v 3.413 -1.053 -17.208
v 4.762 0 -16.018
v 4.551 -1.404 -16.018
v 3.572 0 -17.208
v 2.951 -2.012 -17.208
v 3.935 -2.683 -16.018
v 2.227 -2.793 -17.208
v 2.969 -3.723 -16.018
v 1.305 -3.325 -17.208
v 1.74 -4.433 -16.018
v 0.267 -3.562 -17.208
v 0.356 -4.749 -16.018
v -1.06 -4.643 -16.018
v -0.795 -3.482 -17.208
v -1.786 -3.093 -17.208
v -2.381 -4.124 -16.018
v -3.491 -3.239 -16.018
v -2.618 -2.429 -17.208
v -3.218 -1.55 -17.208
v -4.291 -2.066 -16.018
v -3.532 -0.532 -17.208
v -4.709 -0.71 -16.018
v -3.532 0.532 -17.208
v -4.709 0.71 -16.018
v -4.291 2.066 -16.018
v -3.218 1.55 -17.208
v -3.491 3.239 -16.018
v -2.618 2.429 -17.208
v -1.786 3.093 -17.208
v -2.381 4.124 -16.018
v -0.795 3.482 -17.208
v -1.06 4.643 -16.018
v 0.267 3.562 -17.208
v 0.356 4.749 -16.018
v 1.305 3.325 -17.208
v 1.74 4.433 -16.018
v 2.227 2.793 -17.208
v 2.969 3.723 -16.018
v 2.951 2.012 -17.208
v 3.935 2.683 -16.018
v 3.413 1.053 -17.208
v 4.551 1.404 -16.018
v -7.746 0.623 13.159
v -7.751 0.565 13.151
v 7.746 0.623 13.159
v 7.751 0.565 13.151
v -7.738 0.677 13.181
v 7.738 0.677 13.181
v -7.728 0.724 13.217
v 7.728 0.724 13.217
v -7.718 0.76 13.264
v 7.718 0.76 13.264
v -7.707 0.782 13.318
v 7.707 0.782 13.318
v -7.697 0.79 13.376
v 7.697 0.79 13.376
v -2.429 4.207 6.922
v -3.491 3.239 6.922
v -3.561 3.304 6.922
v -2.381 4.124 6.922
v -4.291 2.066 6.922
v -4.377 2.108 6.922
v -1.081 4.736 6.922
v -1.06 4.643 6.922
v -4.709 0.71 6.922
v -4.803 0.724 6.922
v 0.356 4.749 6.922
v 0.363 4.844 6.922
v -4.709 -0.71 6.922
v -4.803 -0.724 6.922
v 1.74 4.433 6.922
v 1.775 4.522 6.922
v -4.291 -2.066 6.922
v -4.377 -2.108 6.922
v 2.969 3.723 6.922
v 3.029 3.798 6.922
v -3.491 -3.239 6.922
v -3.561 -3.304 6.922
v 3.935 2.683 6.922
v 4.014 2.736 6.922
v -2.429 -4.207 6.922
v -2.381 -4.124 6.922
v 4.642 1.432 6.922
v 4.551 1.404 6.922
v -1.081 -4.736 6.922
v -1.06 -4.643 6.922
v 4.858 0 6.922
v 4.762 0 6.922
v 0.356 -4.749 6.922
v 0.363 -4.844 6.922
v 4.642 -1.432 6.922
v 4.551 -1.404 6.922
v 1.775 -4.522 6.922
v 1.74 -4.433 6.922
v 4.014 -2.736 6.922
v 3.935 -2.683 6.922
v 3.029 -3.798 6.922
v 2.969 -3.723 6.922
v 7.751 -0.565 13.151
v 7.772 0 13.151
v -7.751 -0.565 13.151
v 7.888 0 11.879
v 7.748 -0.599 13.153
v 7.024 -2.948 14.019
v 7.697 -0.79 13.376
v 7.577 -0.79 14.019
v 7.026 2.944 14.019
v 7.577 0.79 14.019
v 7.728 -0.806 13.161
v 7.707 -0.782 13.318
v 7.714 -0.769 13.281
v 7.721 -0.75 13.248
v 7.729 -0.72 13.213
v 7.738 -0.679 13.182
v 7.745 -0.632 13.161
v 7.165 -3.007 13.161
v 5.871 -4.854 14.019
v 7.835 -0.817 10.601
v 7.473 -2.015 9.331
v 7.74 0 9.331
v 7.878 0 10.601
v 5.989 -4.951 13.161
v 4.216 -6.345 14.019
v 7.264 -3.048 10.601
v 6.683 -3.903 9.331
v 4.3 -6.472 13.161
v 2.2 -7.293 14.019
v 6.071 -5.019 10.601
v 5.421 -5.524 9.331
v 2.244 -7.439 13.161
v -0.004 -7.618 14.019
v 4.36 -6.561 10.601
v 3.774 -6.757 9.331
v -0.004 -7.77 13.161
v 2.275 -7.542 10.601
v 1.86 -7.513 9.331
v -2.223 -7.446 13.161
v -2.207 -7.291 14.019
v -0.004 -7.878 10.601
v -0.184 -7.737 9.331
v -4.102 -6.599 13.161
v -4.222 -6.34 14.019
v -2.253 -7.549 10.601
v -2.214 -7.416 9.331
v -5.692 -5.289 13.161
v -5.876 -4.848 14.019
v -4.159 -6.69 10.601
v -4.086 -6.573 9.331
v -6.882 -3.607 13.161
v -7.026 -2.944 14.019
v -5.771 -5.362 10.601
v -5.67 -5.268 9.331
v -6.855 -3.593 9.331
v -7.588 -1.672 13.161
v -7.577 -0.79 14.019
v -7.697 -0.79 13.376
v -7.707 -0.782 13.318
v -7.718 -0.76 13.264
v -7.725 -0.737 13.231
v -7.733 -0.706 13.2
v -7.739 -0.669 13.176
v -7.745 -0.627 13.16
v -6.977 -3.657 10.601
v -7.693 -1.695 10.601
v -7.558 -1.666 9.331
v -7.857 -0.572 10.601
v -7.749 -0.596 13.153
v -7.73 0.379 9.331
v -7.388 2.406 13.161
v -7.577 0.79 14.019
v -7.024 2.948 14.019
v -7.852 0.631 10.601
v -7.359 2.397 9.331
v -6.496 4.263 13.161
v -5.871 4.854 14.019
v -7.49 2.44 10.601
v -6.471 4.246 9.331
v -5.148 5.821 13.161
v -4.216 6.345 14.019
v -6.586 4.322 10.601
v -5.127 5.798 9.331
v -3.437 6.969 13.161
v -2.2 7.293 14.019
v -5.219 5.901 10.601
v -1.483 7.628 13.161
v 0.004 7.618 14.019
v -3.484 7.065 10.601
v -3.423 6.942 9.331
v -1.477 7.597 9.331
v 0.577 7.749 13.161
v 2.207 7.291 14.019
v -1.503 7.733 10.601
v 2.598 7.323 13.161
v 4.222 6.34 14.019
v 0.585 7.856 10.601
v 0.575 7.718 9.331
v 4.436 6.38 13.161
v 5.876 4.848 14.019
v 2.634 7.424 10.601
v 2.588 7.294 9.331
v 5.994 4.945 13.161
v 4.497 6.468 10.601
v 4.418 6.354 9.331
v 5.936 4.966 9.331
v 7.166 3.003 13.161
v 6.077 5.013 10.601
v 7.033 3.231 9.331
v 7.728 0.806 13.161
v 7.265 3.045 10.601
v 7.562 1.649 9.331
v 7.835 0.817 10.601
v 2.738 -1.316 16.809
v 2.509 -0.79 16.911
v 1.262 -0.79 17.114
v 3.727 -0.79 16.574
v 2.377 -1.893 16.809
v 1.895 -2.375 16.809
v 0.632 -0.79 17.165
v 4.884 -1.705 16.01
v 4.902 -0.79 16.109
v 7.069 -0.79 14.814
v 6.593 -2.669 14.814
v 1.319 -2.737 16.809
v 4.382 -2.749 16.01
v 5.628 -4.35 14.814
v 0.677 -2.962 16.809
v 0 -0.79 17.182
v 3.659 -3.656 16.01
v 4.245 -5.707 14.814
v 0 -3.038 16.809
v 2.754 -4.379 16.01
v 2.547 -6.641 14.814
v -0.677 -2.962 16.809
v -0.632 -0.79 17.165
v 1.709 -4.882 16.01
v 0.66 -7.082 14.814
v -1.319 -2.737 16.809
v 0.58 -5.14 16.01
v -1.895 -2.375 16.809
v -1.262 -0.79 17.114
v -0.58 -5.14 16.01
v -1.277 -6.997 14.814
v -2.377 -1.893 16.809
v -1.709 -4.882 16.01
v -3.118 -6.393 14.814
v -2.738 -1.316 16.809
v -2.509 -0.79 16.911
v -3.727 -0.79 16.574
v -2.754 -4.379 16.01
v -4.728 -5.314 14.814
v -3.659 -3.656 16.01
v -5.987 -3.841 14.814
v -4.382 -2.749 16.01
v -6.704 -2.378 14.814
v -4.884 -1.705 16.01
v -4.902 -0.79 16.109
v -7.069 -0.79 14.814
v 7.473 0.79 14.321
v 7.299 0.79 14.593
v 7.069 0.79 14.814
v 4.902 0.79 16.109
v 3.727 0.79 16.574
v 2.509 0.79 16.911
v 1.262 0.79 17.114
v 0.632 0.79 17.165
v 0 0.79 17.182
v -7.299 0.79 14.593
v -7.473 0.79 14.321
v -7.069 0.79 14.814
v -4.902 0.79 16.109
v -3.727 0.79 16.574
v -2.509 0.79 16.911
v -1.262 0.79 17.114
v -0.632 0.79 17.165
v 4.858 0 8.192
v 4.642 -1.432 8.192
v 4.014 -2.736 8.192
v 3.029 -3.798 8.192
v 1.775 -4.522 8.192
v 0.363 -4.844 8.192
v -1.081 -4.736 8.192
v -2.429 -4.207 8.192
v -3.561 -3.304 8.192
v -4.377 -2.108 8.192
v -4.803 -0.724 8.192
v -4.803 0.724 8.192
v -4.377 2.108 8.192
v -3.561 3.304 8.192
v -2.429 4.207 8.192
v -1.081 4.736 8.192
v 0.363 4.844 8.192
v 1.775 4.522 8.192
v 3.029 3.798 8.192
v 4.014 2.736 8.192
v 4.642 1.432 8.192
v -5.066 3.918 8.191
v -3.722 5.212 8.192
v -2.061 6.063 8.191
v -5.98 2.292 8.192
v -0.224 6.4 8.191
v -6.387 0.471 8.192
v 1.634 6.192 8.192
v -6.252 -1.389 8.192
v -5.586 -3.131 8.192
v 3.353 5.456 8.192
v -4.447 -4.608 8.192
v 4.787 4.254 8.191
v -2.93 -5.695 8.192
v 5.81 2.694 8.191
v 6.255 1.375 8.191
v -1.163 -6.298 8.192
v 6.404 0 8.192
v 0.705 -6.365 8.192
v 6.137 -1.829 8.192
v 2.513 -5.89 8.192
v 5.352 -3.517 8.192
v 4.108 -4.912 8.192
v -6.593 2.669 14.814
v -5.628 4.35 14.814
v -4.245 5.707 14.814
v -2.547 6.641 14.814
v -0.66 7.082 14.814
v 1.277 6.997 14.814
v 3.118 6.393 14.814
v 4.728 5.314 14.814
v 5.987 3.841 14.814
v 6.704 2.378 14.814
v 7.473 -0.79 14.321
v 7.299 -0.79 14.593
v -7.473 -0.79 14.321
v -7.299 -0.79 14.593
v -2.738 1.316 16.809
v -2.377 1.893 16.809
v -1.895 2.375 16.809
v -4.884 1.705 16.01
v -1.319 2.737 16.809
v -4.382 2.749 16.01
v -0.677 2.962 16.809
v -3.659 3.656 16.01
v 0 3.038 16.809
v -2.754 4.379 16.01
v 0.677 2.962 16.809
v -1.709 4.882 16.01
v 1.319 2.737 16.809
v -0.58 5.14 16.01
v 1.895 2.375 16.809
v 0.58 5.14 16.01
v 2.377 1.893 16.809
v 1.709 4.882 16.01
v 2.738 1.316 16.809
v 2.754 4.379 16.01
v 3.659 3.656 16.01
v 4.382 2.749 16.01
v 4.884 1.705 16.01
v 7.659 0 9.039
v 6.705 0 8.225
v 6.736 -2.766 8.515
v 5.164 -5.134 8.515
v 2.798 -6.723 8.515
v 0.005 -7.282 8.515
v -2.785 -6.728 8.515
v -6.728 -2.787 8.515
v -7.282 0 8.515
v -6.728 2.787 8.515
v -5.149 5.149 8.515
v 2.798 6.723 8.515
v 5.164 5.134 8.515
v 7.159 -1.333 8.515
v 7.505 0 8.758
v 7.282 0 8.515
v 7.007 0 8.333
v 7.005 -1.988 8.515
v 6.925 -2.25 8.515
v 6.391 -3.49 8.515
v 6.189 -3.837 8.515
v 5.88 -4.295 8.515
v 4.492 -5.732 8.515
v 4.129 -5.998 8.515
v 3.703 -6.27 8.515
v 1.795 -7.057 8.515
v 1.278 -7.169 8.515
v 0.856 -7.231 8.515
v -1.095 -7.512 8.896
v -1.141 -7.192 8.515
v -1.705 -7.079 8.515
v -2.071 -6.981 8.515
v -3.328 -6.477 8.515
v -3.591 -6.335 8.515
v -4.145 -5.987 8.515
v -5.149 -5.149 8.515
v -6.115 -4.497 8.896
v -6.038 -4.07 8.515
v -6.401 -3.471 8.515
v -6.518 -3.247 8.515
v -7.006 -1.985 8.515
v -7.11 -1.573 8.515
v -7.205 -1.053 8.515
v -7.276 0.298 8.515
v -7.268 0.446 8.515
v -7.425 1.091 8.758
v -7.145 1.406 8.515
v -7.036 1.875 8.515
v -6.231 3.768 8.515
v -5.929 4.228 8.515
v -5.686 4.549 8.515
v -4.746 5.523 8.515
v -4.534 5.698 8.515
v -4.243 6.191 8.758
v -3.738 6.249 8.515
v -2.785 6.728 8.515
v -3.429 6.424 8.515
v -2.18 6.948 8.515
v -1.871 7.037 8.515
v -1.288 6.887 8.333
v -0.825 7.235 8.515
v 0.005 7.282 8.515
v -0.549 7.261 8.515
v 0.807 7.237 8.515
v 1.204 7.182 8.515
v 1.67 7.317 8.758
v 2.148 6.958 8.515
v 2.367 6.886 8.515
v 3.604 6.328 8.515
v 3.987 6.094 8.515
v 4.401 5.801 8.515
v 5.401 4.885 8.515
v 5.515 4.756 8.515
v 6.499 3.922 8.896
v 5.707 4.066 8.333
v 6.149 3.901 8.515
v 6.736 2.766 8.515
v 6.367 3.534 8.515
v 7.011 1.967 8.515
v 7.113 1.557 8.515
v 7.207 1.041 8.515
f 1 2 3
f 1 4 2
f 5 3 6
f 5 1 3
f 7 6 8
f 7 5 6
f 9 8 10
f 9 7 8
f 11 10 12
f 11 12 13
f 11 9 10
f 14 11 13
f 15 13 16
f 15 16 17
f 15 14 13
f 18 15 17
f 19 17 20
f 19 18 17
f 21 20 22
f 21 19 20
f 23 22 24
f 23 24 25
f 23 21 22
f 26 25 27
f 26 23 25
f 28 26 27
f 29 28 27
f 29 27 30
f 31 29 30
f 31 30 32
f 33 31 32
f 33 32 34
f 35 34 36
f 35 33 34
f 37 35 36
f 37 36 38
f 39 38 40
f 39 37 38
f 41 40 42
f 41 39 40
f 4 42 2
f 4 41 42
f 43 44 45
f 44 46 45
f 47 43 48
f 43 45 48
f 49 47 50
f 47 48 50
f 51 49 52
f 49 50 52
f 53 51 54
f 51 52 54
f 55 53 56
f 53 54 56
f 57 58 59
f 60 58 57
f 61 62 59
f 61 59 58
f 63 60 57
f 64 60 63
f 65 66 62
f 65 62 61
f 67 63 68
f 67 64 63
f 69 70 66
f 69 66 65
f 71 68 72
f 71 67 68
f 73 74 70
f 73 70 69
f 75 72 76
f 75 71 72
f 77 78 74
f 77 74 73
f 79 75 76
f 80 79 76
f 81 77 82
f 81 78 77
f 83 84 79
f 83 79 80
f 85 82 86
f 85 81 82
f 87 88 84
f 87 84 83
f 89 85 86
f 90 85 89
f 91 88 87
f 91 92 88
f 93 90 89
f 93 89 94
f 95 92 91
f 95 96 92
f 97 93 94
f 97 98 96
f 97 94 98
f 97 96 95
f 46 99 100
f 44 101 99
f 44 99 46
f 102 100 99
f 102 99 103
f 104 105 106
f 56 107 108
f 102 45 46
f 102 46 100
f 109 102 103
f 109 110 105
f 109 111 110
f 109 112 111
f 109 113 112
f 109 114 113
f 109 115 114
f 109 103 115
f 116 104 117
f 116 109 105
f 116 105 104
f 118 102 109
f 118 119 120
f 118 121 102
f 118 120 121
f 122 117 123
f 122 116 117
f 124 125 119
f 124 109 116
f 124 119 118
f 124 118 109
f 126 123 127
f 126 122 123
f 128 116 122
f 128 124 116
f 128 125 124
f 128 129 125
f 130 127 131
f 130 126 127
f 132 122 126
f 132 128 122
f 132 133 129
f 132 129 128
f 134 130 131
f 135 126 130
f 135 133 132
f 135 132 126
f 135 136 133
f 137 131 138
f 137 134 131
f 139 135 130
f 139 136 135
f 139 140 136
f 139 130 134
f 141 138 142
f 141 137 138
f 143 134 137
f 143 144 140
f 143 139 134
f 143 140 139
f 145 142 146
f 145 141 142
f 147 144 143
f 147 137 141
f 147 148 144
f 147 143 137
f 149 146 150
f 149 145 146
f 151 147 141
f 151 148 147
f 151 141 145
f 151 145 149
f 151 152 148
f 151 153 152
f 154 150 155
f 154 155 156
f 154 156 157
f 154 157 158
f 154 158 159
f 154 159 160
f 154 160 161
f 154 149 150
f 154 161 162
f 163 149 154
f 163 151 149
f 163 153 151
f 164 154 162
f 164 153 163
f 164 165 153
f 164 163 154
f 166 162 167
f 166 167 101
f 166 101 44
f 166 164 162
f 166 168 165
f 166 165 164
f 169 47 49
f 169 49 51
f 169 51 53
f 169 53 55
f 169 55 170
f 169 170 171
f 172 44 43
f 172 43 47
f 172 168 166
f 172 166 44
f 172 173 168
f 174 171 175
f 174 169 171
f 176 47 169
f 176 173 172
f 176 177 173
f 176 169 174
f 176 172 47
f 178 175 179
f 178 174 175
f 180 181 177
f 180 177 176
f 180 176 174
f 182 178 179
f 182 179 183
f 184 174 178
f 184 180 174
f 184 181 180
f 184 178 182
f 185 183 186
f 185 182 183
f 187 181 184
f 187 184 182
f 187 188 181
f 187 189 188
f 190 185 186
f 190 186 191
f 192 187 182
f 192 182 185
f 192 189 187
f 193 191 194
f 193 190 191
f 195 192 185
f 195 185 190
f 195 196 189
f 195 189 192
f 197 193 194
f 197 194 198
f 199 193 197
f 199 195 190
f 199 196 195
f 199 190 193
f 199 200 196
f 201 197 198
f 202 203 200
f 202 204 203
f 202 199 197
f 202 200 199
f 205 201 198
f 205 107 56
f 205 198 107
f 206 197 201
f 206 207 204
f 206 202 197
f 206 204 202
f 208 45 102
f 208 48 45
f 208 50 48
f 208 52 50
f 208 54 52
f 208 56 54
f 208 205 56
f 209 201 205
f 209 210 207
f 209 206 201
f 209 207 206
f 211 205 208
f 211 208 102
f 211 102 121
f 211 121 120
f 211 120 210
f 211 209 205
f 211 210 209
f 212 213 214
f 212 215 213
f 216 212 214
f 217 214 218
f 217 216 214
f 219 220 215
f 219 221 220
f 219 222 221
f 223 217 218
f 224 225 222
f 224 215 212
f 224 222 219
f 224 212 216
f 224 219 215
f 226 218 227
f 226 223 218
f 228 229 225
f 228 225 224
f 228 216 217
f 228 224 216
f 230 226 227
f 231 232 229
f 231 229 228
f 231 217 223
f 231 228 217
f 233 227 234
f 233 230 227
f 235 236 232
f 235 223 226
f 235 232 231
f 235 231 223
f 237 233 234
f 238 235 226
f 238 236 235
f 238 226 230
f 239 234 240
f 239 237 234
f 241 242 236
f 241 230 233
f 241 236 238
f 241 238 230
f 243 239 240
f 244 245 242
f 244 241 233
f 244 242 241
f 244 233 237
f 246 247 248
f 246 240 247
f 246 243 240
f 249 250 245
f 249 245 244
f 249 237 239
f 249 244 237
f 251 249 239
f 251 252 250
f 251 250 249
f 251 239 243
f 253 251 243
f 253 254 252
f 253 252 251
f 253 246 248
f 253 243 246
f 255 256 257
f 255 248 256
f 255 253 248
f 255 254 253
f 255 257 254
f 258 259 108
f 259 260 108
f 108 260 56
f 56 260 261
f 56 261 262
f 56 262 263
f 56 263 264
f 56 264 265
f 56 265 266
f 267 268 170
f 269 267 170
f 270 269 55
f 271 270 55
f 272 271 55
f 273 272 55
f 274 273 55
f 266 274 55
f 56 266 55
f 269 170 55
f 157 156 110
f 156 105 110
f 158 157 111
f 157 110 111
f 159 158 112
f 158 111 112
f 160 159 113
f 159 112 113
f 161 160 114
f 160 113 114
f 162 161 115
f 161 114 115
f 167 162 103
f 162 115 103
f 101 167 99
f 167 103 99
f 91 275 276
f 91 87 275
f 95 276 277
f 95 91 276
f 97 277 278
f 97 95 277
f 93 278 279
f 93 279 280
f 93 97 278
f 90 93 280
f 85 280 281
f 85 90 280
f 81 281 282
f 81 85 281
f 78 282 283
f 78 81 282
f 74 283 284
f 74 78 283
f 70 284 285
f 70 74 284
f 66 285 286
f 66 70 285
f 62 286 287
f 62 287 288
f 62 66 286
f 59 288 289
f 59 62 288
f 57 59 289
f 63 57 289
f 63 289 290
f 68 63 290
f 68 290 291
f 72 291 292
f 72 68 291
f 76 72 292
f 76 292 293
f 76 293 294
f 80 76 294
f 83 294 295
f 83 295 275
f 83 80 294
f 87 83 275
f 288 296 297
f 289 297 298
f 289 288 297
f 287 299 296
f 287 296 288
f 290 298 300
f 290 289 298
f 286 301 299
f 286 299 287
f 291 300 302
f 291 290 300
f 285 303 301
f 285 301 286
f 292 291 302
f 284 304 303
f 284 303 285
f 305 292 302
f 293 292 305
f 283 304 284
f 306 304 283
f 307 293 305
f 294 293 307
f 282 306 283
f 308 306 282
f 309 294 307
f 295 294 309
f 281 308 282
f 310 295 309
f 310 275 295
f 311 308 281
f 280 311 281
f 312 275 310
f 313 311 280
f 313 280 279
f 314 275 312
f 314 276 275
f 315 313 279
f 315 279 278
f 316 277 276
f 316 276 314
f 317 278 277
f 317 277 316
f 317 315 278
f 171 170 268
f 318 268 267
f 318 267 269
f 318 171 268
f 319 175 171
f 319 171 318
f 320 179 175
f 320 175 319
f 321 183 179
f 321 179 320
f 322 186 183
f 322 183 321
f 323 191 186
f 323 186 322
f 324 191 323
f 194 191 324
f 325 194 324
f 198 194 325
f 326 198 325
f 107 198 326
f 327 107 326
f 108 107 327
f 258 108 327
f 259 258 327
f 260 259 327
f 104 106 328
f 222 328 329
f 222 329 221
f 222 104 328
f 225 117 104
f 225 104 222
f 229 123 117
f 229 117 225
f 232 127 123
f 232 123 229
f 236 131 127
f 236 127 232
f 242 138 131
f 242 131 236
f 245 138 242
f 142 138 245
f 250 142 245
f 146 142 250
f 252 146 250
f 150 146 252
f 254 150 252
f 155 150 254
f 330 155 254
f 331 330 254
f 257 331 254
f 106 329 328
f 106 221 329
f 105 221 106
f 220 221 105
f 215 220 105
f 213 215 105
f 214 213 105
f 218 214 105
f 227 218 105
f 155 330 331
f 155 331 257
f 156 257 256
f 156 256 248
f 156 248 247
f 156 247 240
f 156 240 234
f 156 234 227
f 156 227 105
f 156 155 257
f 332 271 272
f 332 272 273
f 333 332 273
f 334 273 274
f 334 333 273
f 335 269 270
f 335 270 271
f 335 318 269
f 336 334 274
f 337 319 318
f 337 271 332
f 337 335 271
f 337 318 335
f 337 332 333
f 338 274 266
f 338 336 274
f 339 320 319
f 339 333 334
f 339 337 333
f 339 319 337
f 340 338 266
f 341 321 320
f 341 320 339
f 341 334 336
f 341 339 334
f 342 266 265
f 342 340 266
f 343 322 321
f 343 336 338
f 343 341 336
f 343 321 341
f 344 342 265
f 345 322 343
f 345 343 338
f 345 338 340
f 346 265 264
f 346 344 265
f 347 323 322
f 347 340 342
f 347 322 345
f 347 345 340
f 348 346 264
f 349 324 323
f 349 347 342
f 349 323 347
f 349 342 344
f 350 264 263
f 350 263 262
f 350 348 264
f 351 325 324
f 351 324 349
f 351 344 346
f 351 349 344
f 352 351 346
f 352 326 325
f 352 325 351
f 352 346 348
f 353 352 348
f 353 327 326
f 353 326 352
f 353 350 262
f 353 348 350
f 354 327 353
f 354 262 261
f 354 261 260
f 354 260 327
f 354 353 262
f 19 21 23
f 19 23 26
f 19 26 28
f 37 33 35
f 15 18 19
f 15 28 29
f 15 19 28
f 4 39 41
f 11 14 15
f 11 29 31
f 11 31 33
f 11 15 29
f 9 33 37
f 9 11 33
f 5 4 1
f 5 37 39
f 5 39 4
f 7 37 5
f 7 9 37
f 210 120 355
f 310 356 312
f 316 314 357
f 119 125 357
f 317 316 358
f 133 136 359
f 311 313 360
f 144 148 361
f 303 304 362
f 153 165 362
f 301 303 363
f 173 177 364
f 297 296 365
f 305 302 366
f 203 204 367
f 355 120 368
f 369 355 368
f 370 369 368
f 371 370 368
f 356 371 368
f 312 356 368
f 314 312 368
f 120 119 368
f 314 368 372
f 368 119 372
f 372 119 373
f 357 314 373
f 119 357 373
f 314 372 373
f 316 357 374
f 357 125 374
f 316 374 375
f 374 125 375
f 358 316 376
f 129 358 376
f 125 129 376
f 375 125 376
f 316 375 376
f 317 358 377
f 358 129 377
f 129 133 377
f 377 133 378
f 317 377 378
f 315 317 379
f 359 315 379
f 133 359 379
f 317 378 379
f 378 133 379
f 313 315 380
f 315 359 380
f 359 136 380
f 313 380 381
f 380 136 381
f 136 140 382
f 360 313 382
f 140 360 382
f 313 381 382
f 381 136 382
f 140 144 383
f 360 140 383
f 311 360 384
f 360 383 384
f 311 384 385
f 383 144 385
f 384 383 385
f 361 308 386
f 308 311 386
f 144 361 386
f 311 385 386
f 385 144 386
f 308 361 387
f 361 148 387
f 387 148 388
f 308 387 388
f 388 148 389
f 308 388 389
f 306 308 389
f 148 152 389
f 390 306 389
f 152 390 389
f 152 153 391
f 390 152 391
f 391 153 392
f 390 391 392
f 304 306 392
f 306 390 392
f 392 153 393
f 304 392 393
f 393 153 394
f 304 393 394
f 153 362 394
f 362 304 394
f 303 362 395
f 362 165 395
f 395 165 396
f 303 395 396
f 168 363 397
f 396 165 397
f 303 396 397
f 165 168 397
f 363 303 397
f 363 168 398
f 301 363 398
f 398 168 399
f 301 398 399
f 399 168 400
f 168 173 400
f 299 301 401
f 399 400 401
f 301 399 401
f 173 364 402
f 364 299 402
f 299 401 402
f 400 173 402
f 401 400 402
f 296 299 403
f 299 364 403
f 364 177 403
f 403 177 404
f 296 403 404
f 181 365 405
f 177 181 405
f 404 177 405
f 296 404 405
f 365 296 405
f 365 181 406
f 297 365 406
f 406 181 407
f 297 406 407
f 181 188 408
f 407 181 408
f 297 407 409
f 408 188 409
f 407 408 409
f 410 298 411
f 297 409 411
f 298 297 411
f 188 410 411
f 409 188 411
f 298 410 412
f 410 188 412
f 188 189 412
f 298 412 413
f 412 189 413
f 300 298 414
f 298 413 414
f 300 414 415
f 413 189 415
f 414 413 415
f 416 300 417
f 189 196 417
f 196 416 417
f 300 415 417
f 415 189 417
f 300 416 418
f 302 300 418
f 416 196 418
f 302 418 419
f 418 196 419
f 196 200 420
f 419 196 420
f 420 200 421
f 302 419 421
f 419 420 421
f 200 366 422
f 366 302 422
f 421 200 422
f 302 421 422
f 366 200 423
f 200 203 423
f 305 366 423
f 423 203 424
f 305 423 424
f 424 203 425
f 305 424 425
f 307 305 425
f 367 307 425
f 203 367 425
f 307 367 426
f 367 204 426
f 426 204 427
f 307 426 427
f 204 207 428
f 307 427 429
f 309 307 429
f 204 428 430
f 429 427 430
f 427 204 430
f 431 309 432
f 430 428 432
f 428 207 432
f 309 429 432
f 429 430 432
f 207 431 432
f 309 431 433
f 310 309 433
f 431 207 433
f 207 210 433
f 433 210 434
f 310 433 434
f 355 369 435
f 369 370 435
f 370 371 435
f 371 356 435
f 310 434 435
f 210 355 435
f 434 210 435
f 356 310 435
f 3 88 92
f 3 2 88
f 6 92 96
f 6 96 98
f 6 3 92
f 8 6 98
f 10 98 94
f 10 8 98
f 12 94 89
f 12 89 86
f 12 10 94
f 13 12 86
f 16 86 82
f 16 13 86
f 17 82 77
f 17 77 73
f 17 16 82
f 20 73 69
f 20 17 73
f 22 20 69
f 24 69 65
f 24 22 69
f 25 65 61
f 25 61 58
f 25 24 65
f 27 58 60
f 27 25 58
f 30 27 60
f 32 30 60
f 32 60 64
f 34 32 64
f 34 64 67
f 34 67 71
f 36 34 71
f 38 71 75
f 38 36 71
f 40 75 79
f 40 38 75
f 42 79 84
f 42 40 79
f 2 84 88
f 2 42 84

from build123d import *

# Parameters (mm, degrees)
CUT_EXTRUDE1_DEPTH      = 21.516664352
CUT_EXTRUDE1_DEPTH_BACK = 21.516664352
SKETCH9_W               = 4.05765
SKETCH9_H               = 1.57988
FILLET1_R               = 0.225425
FILLET2_R               = 1.35255


with BuildPart() as part:
    # Sketch2 → Revolve1 (revolve)
    with BuildSketch(Plane(origin=(0, 0, 0), x_dir=(0, 0, -1), z_dir=(1, 0, 0)), mode=Mode.PRIVATE) as revolve1_sk:
        with BuildLine():
            Line((-8.1915, 7.50443), (-8.1915, 4.85775))
            Line((-8.1915, 4.85775), (-6.9215, 4.85775))
            Line((-6.9215, 4.85775), (-6.9215, 4.7625))
            Line((-6.9215, 4.7625), (16.017875, 4.7625))
            Line((16.017875, 4.7625), (17.2085, 3.571875))
            Line((17.2085, 3.571875), (17.2085, 0))
            Line((17.2085, 0), (-17.2085, 0))
            ThreePointArc((-17.2085, 0), (-16.511577735, 3.988547218), (-14.5034, 7.50443))
            ThreePointArc((-14.5034, 7.50443), (-11.34745, 7.8994), (-8.1915, 7.50443))
        make_face()
    revolve(revolve1_sk.sketch.rotate(Axis((0, 0, 17.2085), (0, 0, -1)), 90), axis=Axis((0, 0, 17.2085), (0, 0, -1)))

    # Sketch9 → Cut-Extrude1 (cut, two sides: drawn at the far end of the back side and taken through both)
    with BuildSketch(Plane(origin=(0, 0, 0), x_dir=(0, 0, -1), z_dir=(1, 0, 0)).offset(-CUT_EXTRUDE1_DEPTH_BACK)):
        with Locations((-15.179675, 0)):
            Rectangle(SKETCH9_W, SKETCH9_H)
    extrude(amount=CUT_EXTRUDE1_DEPTH + CUT_EXTRUDE1_DEPTH_BACK, mode=Mode.SUBTRACT)

    # Fillet1
    fillet1_edges = [part.edges().sort_by_distance(p)[0] for p in [
        (0, 0.78994, 13.15085),
        (0, -0.78994, 13.15085),
    ]]
    fillet(fillet1_edges, radius=FILLET1_R)

    # Fillet2
    fillet2_edges = [part.edges().sort_by_distance(p)[0] for p in [
        (-7.50443, 0, 8.1915),
        (0, -7.50443, 14.5034),
        (0, 7.50443, 14.5034),
    ]]
    fillet(fillet2_edges, radius=FILLET2_R)


solid = part.part
